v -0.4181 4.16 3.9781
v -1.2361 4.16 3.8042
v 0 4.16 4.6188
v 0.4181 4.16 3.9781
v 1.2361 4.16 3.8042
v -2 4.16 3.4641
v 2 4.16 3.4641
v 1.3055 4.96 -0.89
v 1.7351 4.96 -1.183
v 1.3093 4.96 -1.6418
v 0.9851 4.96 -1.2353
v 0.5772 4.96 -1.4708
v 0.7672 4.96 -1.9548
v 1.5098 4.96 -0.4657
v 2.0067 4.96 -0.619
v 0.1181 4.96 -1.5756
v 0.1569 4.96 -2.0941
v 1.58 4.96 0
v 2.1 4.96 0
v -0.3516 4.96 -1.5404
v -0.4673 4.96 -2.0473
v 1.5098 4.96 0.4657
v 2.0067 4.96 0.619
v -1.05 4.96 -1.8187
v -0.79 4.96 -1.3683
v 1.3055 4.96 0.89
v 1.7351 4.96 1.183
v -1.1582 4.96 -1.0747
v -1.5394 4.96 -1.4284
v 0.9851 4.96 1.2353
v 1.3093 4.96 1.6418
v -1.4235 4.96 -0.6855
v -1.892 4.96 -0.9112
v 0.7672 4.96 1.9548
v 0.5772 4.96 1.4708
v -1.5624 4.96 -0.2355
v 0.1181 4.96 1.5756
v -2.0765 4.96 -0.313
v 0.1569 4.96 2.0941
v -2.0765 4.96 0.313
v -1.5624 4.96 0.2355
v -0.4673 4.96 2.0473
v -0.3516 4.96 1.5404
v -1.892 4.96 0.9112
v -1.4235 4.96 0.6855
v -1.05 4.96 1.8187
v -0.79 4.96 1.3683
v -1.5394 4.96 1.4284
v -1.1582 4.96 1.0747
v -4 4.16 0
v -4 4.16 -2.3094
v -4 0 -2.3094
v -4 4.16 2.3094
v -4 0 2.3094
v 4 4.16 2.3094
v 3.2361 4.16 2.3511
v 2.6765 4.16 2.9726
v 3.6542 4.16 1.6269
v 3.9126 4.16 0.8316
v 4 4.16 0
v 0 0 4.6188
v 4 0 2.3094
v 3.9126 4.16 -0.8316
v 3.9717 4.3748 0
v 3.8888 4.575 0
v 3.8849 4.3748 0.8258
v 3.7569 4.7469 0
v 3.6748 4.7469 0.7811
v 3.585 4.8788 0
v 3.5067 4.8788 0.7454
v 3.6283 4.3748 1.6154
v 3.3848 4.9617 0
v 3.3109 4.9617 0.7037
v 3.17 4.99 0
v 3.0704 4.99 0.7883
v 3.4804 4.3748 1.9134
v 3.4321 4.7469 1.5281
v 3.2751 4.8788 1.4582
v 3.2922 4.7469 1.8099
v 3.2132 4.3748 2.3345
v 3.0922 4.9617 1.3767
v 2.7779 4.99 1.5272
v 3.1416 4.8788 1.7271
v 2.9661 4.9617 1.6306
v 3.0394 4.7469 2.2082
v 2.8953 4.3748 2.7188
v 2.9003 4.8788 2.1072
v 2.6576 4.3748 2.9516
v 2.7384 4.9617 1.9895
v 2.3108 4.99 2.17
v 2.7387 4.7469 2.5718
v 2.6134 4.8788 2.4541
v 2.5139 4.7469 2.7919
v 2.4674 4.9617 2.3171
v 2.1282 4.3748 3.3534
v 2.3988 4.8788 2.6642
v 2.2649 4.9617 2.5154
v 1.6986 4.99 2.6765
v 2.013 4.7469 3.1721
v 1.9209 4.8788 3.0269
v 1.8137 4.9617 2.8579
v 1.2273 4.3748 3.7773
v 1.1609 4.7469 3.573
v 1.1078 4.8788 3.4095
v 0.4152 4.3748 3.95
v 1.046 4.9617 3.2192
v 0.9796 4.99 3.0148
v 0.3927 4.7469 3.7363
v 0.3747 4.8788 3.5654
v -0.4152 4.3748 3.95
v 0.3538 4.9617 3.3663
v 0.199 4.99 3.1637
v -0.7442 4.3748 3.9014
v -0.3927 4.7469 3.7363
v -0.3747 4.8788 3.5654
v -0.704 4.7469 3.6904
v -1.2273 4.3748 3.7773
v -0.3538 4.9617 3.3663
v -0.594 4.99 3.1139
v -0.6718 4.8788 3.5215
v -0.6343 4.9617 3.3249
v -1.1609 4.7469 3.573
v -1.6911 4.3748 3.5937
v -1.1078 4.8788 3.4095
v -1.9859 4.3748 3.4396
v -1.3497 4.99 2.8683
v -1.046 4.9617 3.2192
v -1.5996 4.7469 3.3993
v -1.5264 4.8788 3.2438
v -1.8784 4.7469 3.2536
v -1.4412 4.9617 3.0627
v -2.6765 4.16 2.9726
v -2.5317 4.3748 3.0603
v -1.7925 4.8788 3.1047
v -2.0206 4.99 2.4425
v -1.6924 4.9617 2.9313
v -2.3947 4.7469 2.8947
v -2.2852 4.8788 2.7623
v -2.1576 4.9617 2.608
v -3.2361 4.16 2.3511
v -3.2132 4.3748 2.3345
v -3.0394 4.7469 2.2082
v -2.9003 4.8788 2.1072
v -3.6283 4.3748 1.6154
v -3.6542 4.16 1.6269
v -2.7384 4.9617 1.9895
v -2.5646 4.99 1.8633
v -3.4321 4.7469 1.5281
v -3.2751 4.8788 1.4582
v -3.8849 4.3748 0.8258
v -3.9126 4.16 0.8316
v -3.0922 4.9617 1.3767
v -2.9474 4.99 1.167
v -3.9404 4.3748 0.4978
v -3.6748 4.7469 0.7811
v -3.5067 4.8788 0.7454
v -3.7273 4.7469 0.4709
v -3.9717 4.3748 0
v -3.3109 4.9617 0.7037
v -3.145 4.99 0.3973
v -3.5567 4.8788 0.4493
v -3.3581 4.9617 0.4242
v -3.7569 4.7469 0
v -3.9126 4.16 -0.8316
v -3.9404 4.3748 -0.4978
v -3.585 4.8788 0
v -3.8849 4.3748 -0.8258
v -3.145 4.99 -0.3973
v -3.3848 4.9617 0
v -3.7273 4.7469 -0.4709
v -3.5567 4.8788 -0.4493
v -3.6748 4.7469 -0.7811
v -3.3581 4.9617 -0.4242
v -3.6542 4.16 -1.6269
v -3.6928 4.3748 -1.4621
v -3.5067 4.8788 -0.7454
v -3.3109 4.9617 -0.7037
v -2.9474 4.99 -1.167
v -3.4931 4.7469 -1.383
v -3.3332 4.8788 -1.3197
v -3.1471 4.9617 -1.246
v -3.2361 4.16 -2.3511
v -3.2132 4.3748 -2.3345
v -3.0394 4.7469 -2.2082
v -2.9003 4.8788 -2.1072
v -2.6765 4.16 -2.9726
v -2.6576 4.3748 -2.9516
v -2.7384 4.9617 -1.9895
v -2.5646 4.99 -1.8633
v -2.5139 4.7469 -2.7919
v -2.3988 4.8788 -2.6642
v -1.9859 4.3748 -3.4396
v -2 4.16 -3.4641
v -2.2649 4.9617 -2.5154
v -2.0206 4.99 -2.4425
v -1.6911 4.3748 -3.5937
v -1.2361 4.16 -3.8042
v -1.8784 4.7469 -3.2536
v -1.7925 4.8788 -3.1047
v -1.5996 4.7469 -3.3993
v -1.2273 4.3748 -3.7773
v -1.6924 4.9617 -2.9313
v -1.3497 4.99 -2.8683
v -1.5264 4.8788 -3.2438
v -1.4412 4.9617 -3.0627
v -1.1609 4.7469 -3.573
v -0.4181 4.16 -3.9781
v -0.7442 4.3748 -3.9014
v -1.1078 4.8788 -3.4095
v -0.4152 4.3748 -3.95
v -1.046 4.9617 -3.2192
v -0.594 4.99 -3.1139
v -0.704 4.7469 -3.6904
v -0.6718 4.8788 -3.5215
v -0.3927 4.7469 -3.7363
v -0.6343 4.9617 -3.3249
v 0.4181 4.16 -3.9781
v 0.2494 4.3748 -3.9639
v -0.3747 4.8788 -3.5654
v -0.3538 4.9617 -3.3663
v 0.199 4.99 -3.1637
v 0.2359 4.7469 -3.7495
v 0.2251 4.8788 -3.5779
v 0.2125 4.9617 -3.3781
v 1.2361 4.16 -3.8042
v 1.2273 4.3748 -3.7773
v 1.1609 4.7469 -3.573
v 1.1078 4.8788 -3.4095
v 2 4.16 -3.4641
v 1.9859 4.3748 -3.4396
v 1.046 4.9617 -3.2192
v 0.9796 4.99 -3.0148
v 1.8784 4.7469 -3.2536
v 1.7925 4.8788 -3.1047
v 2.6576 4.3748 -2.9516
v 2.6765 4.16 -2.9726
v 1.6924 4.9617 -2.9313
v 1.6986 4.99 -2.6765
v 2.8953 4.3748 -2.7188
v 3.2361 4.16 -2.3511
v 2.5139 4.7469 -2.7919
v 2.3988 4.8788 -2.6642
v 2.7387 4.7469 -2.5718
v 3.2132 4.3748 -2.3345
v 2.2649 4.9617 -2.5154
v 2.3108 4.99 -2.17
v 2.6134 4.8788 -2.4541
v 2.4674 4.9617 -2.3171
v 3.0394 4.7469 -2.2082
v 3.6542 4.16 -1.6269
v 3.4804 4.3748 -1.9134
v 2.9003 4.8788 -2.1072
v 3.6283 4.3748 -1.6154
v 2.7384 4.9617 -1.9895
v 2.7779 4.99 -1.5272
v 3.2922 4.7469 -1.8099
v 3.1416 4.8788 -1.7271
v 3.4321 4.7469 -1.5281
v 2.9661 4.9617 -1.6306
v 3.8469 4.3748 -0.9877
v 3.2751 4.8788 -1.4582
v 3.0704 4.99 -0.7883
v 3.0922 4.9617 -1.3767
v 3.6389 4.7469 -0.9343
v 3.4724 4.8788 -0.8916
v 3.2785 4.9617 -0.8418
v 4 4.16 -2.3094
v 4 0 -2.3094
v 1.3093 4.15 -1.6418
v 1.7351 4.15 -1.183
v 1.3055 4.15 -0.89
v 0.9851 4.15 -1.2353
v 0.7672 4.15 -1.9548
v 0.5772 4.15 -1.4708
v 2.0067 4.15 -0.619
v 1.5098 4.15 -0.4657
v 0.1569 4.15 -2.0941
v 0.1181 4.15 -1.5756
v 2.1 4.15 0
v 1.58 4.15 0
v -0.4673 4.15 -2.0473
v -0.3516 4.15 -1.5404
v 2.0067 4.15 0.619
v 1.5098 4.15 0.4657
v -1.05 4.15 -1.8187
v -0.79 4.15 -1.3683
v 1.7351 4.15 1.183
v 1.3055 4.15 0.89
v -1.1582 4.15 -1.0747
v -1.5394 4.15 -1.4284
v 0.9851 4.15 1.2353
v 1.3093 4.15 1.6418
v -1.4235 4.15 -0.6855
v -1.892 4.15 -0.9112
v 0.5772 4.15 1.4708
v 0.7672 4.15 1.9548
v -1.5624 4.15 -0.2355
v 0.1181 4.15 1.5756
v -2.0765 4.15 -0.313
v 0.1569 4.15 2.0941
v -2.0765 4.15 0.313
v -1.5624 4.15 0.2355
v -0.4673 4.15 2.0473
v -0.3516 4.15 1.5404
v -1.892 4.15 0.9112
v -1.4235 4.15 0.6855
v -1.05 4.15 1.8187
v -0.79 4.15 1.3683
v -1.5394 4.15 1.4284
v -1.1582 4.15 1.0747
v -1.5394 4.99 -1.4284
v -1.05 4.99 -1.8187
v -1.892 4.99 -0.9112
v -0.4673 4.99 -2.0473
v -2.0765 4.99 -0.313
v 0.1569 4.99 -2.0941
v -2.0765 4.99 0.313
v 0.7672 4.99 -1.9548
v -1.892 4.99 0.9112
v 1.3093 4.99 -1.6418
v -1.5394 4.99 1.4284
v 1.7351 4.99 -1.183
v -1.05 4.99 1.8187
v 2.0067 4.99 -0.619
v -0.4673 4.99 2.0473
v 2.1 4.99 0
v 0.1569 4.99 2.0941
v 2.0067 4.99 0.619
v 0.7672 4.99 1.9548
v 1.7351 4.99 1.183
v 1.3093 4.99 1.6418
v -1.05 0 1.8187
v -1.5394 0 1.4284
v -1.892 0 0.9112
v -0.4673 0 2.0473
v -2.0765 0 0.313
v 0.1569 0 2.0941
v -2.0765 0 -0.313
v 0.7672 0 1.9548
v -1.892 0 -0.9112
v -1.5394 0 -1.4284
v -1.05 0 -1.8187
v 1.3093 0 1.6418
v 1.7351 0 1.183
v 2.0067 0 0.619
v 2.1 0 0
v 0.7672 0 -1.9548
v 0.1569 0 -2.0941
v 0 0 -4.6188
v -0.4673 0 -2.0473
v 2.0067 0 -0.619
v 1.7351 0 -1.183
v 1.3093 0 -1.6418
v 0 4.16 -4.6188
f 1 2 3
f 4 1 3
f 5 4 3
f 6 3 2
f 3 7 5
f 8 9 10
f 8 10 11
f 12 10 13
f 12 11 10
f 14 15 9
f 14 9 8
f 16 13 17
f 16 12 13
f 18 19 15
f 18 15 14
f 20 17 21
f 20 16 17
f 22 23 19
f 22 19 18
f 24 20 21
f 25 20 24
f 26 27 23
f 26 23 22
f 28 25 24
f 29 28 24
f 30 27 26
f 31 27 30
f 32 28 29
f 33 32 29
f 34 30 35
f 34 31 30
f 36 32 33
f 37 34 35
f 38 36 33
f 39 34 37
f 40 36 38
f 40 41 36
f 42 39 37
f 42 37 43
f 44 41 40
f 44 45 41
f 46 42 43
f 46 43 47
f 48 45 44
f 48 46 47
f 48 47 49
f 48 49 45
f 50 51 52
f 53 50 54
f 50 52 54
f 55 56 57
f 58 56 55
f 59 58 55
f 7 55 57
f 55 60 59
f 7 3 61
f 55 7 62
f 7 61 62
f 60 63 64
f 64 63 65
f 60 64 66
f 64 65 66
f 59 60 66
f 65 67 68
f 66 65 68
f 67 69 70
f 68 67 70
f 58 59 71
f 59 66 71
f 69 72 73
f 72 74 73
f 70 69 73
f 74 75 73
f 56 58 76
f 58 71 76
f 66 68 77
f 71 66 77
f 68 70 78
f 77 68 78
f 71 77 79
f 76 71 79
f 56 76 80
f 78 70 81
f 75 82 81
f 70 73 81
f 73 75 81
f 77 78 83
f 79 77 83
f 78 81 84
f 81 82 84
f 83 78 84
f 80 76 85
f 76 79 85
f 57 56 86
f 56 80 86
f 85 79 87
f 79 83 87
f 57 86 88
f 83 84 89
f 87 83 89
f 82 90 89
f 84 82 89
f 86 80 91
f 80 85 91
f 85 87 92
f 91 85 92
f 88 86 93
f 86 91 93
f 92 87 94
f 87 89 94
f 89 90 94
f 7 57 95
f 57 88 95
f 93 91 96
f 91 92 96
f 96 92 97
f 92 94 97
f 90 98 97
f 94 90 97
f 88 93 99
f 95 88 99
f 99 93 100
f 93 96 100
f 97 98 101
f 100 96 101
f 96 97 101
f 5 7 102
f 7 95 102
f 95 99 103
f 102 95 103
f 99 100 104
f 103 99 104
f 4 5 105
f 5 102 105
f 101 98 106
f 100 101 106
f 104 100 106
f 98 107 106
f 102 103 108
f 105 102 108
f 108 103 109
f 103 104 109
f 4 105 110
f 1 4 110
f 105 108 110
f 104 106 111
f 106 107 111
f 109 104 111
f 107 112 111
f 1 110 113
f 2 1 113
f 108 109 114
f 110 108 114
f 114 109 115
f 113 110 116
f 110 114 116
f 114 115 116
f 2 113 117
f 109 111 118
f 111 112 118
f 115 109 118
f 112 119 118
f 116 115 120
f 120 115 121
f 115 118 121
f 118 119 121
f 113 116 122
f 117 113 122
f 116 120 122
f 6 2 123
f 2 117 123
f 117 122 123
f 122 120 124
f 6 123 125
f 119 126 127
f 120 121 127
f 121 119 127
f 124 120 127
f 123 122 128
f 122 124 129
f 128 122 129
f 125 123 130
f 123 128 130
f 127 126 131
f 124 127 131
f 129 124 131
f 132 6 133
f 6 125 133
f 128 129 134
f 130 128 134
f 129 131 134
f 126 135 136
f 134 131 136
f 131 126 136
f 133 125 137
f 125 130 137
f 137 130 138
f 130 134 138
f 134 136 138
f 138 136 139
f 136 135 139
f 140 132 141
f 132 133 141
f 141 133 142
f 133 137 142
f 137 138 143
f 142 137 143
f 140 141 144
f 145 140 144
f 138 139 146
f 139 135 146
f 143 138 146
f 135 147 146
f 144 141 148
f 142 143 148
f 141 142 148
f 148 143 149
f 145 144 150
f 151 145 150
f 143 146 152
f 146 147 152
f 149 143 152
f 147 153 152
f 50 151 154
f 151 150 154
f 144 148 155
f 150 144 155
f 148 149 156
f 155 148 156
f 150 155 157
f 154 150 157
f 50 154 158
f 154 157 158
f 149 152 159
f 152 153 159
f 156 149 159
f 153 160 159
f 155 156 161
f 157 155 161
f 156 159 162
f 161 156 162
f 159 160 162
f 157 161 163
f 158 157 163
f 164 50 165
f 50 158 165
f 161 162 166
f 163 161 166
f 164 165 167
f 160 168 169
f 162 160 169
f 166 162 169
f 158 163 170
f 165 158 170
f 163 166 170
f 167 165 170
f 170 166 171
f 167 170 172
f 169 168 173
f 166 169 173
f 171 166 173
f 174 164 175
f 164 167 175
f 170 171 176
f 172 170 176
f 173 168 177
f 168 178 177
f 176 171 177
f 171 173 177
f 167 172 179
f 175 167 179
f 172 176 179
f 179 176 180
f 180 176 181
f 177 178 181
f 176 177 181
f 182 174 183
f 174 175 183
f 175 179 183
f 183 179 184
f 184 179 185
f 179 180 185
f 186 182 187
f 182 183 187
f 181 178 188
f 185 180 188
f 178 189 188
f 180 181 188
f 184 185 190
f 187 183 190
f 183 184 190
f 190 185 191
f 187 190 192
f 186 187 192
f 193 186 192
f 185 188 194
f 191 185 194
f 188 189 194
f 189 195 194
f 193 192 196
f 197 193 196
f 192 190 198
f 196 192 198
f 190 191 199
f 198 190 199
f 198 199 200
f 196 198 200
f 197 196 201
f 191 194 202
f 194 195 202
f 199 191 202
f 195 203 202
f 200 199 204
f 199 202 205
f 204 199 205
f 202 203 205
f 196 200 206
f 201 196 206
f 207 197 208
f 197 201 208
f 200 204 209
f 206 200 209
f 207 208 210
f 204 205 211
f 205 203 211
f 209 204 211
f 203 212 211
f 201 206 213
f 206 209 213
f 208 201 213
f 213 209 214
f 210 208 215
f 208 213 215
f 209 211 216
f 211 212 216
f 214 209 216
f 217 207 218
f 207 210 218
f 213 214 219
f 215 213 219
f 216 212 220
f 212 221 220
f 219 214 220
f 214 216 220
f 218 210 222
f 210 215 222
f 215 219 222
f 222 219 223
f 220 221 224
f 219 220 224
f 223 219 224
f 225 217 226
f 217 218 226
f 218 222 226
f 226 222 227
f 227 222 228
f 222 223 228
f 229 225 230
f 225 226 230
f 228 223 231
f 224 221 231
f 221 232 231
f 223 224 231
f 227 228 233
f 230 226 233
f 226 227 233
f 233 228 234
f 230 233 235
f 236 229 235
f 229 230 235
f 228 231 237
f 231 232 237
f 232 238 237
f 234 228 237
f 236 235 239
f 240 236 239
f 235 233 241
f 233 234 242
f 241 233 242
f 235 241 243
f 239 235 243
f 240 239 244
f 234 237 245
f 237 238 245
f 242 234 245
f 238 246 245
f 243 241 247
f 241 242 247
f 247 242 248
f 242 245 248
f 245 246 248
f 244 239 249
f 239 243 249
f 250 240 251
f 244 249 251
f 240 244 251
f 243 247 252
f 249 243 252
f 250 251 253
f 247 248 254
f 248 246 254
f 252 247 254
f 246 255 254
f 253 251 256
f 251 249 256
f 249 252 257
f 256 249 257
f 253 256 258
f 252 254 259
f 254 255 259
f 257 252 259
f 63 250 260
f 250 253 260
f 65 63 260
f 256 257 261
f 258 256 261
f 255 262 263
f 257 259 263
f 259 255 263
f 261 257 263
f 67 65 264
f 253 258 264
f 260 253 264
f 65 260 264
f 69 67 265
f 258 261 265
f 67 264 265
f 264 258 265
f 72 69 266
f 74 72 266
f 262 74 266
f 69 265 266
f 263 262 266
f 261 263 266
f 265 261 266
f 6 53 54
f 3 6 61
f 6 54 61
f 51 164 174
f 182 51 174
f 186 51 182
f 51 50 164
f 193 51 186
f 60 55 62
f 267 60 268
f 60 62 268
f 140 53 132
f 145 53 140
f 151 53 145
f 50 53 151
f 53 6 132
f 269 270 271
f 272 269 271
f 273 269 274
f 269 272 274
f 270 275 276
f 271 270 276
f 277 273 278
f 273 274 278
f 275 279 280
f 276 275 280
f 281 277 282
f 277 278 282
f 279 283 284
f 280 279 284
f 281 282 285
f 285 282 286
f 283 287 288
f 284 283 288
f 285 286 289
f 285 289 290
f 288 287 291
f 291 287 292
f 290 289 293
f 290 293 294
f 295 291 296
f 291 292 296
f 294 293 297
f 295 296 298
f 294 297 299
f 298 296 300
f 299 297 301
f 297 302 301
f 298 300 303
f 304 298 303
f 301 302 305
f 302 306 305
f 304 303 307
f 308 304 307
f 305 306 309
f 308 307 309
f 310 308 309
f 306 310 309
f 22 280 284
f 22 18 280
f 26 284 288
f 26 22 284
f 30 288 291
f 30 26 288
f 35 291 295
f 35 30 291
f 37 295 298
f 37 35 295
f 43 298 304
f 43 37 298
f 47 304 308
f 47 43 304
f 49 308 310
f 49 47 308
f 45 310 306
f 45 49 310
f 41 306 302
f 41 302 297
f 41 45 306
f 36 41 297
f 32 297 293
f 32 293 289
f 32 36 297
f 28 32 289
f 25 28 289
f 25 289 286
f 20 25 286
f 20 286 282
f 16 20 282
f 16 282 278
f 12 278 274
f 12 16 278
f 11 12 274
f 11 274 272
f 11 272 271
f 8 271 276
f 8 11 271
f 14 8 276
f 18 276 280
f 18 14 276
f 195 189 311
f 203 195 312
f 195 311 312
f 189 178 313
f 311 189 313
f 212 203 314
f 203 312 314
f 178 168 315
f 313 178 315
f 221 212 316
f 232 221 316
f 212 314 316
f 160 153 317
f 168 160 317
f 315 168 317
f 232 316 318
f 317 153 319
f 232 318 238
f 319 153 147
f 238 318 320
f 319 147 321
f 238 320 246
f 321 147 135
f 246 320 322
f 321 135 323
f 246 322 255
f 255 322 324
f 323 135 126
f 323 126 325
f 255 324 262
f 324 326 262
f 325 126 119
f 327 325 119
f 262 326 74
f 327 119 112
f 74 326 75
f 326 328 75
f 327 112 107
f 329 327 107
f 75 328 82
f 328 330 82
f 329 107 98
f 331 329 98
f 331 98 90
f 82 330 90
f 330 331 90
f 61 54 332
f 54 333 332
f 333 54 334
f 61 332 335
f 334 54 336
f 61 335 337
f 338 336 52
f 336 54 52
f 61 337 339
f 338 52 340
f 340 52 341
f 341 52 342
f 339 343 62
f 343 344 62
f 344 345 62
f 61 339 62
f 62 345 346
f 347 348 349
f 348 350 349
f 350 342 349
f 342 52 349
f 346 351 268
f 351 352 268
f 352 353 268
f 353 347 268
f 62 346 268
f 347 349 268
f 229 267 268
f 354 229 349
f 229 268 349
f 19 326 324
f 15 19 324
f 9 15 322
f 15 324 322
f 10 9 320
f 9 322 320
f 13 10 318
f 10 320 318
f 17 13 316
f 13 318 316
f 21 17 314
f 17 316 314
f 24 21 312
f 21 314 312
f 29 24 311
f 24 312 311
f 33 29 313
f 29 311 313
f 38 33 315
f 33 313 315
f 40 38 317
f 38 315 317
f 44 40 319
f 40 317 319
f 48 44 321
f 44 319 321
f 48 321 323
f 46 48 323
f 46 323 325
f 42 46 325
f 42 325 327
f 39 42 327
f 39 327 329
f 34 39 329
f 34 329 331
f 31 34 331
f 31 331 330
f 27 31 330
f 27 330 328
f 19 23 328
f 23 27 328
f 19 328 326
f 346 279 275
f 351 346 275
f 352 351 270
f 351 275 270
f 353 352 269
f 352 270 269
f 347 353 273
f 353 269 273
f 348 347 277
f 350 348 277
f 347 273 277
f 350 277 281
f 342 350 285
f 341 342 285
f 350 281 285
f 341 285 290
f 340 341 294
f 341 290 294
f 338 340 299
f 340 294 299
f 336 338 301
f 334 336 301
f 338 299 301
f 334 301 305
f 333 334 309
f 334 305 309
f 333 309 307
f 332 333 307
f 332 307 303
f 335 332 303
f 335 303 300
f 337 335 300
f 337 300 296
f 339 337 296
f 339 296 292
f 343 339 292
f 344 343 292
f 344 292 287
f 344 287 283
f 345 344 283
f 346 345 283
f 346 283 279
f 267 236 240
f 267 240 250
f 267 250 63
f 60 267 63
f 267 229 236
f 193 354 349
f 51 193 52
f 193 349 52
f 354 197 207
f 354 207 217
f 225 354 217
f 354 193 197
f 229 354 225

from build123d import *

# Parameters (mm, degrees)
BOSS_EXTRUDE1_DEPTH         = 4.159999906
TAP_DRILL_FOR_M5X0_8_TAP1_D = 4.2
SKETCH8_W                   = 0.52
SKETCH8_H                   = 0.81


with BuildPart() as part:
    # Sketch1 → Boss-Extrude1 (new body)
    with BuildSketch(Plane(origin=(0, 0, 0), x_dir=(1, 0, 0), z_dir=(0, 1, 0))):
        Polygon((-4, -2.309401077), (0, -4.618802154), (4, -2.309401077), (4, 2.309401077), (0, 4.618802154), (-4, 2.309401077), align=None)
    extrude(amount=BOSS_EXTRUDE1_DEPTH)

    # Sketch3 → Revolve1 (revolve)
    with BuildSketch(Plane.XY):
        with BuildLine():
            Line((3.17, 4.989999906), (0, 4.989999906))
            Line((0, 4.989999906), (0, 4.159999906))
            Line((0, 4.159999906), (4, 4.159999906))
            ThreePointArc((4, 4.159999906), (3.756898628, 4.746898534), (3.17, 4.989999906))
        make_face()
    revolve(axis=Axis((0, 4.989999906, 0), (0, -1, 0)))

    # Tap Drill for M5x0.8 Tap1 (through all)
    with Locations(Plane(origin=(0, 0, 0), x_dir=(-1, 0, 0), z_dir=(0, -1, 0))):
        with Locations((0, 0)):
            Hole(TAP_DRILL_FOR_M5X0_8_TAP1_D / 2)

    # Sketch8 → Revolve2 (revolve)
    with BuildSketch(Plane.XY):
        with Locations((1.84, 4.554999966)):
            Rectangle(SKETCH8_W, SKETCH8_H)
    revolve(axis=Axis((0, 4.989999906, 0), (0, -1, 0)))


solid = part.part
